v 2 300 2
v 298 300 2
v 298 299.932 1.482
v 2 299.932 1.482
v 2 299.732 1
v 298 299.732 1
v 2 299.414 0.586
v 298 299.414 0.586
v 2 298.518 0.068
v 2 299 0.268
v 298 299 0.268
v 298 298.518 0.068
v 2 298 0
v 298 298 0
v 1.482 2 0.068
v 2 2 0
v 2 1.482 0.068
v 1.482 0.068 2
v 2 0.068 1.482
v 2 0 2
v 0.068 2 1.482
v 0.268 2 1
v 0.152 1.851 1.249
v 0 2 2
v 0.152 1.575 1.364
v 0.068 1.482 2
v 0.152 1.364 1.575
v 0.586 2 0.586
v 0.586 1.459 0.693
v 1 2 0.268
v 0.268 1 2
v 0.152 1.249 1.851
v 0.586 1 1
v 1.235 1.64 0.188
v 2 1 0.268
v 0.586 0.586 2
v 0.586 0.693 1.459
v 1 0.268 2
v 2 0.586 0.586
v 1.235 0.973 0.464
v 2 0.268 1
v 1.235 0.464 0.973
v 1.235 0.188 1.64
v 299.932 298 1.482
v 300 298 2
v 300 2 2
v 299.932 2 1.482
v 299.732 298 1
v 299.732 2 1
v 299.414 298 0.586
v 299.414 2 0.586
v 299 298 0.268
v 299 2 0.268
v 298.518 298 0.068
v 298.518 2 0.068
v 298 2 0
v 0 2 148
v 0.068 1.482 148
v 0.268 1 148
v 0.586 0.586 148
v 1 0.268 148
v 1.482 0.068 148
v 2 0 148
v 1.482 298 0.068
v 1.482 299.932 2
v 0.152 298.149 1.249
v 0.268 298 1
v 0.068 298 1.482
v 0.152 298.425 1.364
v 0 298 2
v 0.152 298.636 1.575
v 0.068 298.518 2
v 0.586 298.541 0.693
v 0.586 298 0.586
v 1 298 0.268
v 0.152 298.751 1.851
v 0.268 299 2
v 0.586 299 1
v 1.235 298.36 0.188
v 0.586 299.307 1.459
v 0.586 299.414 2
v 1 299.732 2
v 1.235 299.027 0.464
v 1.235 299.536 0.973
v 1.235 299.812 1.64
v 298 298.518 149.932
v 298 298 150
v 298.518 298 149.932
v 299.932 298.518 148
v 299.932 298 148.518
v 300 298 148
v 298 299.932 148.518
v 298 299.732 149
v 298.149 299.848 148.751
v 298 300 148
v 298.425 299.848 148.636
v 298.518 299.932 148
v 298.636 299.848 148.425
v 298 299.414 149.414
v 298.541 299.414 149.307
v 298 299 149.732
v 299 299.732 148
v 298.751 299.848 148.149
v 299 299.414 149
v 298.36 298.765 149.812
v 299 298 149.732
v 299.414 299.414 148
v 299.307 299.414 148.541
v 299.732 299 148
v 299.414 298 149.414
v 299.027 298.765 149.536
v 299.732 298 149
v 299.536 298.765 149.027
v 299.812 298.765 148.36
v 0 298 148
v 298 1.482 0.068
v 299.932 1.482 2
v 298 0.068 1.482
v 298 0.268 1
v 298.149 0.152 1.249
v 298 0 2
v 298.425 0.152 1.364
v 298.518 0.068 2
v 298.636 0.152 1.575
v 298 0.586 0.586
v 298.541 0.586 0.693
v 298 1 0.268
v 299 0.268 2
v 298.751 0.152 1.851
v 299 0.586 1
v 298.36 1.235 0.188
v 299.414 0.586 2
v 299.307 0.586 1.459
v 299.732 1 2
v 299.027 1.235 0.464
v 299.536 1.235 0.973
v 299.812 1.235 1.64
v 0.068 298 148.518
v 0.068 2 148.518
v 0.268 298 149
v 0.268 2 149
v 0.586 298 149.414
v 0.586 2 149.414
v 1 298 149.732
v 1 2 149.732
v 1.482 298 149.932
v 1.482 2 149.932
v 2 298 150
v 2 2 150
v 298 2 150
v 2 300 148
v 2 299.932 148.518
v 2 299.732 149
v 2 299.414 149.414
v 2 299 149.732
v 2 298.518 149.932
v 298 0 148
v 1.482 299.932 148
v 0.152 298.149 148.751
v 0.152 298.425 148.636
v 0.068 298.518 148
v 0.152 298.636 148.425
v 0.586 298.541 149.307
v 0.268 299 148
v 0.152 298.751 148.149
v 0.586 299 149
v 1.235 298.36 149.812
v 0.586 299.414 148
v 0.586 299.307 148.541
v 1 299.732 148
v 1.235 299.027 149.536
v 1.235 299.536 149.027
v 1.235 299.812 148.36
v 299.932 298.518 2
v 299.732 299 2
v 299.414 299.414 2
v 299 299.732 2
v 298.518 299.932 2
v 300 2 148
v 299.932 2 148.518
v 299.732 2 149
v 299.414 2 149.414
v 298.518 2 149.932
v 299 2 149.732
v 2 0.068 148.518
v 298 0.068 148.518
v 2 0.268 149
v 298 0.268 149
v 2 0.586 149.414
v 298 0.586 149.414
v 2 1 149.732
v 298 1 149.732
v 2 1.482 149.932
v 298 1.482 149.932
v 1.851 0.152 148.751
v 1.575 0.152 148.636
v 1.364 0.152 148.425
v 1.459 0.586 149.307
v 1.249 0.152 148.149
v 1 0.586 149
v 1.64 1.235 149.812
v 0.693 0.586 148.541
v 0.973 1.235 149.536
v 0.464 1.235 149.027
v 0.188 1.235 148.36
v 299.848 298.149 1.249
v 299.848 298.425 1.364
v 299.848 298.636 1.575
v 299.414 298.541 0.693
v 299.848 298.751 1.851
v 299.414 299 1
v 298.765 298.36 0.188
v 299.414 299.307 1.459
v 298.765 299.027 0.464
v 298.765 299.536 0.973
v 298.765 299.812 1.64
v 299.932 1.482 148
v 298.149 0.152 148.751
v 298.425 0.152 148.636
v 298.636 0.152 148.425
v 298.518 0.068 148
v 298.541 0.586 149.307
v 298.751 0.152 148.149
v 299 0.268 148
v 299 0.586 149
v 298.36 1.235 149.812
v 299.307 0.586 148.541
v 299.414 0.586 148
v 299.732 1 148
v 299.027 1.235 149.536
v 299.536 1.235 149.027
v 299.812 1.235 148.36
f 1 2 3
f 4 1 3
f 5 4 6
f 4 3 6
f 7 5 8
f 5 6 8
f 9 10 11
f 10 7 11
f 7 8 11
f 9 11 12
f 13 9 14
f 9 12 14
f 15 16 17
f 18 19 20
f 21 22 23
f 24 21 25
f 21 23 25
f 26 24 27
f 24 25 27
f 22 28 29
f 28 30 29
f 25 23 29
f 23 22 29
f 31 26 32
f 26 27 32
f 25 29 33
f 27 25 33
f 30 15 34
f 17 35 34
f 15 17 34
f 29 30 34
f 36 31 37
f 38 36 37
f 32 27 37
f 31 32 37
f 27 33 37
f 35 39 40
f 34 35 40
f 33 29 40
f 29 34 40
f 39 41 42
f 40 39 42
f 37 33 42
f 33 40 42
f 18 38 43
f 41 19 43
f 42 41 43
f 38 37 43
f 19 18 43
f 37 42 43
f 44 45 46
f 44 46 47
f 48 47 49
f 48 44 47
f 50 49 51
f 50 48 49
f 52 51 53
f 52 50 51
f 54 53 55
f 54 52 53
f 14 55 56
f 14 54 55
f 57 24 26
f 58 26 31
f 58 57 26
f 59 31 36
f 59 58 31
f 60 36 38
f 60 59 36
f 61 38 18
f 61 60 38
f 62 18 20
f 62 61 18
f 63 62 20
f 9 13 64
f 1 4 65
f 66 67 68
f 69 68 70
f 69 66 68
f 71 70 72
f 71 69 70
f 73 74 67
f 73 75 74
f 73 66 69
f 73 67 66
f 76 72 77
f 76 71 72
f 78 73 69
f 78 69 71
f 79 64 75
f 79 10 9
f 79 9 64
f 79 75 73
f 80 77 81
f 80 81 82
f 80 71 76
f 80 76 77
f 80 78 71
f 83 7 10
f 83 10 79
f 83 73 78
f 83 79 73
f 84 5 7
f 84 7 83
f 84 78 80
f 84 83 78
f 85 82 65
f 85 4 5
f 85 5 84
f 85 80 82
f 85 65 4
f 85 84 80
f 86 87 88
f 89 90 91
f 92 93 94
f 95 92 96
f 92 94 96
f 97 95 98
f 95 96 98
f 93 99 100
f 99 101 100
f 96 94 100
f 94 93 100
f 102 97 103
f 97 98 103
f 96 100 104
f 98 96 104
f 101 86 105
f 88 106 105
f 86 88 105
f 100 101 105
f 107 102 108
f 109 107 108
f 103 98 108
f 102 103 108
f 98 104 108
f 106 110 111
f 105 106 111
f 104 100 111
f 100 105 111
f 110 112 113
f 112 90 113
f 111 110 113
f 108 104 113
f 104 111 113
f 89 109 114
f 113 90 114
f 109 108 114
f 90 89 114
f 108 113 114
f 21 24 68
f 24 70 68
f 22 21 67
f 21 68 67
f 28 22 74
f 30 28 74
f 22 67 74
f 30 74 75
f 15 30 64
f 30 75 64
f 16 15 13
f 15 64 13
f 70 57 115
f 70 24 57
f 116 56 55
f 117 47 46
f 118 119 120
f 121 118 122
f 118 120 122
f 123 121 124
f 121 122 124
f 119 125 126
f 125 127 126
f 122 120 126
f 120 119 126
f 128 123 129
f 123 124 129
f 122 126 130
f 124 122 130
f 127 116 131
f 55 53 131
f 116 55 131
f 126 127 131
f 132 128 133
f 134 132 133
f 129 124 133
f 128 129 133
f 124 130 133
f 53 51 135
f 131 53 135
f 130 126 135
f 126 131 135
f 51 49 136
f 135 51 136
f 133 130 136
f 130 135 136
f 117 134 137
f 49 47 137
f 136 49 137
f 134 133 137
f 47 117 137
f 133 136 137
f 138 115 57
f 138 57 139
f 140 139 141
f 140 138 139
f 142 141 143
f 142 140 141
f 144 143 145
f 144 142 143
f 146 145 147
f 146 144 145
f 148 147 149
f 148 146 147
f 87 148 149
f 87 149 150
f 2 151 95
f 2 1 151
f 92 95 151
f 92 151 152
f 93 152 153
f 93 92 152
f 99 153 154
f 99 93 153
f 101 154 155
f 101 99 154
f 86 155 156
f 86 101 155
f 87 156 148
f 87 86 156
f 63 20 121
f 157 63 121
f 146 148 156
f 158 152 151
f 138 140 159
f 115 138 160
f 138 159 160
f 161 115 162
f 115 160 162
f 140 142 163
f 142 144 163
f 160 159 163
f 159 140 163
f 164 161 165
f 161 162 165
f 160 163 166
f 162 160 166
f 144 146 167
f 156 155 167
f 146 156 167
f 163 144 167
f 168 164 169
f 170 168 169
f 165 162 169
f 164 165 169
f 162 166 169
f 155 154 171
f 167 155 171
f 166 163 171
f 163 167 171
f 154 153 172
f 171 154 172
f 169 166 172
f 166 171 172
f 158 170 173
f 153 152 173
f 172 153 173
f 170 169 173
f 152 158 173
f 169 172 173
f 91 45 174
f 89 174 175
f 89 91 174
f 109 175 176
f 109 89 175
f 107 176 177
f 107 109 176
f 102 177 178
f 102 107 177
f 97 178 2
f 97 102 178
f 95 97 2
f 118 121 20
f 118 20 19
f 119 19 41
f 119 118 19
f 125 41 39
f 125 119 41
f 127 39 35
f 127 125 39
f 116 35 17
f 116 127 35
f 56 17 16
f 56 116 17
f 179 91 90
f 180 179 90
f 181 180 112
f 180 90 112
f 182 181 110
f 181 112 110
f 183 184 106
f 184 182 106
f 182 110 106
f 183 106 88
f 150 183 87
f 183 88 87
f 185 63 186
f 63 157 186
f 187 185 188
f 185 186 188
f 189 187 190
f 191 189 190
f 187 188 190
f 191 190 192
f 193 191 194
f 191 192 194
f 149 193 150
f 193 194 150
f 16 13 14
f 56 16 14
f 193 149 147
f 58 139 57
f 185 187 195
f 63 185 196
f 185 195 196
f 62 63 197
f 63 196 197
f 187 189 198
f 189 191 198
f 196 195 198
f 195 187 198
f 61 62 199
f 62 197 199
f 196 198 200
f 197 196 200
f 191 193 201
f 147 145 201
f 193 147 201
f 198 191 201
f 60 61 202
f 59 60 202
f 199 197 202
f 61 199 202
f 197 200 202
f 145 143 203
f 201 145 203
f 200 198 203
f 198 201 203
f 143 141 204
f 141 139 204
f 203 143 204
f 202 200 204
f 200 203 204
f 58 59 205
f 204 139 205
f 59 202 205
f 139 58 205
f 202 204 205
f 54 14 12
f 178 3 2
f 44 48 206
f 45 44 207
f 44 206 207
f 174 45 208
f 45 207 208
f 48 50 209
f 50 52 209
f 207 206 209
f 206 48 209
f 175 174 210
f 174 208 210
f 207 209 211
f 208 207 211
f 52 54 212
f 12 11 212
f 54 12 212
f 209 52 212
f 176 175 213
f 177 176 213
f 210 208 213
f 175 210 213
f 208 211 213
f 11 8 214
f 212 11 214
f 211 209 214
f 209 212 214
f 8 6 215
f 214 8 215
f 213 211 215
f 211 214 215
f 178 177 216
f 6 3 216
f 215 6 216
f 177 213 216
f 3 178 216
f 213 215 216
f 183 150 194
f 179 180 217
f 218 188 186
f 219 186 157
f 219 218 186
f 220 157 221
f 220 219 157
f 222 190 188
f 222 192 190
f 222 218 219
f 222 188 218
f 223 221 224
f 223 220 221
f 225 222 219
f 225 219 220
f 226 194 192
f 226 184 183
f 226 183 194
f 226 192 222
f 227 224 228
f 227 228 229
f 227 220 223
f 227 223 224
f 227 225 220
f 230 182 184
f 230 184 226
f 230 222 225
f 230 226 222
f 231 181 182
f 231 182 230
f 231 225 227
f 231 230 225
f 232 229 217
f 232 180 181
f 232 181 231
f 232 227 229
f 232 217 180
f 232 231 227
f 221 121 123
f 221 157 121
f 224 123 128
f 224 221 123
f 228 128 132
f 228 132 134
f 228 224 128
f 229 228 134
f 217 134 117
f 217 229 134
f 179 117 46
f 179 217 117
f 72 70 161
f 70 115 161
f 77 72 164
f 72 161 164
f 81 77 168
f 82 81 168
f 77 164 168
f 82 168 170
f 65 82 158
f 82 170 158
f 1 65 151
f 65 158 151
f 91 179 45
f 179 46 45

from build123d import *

# Parameters (mm, degrees)
SKETCH_1_W      = 300
SKETCH_1_H      = 300
EXTRUDE_1_DEPTH = 150
FILLET_1_R      = 2


with BuildPart() as part:
    # 草图1 → 凸台-拉伸1 (new body)
    with BuildSketch(Plane.XY):
        with Locations((150, 150)):
            Rectangle(SKETCH_1_W, SKETCH_1_H)
    extrude(amount=EXTRUDE_1_DEPTH)

    # 圆角1
    fillet_1_edges = [part.edges().sort_by_distance(p)[0] for p in [
        (300, 150, 150),
        (150, 300, 150),
        (0, 150, 150),
        (150, 300, 0),
        (300, 150, 0),
        (150, 0, 0),
        (0, 150, 0),
        (150, 0, 150),
        (0, 300, 75),
        (300, 300, 75),
        (300, 0, 75),
        (0, 0, 75),
    ]]
    fillet(fillet_1_edges, radius=FILLET_1_R)


solid = part.part
